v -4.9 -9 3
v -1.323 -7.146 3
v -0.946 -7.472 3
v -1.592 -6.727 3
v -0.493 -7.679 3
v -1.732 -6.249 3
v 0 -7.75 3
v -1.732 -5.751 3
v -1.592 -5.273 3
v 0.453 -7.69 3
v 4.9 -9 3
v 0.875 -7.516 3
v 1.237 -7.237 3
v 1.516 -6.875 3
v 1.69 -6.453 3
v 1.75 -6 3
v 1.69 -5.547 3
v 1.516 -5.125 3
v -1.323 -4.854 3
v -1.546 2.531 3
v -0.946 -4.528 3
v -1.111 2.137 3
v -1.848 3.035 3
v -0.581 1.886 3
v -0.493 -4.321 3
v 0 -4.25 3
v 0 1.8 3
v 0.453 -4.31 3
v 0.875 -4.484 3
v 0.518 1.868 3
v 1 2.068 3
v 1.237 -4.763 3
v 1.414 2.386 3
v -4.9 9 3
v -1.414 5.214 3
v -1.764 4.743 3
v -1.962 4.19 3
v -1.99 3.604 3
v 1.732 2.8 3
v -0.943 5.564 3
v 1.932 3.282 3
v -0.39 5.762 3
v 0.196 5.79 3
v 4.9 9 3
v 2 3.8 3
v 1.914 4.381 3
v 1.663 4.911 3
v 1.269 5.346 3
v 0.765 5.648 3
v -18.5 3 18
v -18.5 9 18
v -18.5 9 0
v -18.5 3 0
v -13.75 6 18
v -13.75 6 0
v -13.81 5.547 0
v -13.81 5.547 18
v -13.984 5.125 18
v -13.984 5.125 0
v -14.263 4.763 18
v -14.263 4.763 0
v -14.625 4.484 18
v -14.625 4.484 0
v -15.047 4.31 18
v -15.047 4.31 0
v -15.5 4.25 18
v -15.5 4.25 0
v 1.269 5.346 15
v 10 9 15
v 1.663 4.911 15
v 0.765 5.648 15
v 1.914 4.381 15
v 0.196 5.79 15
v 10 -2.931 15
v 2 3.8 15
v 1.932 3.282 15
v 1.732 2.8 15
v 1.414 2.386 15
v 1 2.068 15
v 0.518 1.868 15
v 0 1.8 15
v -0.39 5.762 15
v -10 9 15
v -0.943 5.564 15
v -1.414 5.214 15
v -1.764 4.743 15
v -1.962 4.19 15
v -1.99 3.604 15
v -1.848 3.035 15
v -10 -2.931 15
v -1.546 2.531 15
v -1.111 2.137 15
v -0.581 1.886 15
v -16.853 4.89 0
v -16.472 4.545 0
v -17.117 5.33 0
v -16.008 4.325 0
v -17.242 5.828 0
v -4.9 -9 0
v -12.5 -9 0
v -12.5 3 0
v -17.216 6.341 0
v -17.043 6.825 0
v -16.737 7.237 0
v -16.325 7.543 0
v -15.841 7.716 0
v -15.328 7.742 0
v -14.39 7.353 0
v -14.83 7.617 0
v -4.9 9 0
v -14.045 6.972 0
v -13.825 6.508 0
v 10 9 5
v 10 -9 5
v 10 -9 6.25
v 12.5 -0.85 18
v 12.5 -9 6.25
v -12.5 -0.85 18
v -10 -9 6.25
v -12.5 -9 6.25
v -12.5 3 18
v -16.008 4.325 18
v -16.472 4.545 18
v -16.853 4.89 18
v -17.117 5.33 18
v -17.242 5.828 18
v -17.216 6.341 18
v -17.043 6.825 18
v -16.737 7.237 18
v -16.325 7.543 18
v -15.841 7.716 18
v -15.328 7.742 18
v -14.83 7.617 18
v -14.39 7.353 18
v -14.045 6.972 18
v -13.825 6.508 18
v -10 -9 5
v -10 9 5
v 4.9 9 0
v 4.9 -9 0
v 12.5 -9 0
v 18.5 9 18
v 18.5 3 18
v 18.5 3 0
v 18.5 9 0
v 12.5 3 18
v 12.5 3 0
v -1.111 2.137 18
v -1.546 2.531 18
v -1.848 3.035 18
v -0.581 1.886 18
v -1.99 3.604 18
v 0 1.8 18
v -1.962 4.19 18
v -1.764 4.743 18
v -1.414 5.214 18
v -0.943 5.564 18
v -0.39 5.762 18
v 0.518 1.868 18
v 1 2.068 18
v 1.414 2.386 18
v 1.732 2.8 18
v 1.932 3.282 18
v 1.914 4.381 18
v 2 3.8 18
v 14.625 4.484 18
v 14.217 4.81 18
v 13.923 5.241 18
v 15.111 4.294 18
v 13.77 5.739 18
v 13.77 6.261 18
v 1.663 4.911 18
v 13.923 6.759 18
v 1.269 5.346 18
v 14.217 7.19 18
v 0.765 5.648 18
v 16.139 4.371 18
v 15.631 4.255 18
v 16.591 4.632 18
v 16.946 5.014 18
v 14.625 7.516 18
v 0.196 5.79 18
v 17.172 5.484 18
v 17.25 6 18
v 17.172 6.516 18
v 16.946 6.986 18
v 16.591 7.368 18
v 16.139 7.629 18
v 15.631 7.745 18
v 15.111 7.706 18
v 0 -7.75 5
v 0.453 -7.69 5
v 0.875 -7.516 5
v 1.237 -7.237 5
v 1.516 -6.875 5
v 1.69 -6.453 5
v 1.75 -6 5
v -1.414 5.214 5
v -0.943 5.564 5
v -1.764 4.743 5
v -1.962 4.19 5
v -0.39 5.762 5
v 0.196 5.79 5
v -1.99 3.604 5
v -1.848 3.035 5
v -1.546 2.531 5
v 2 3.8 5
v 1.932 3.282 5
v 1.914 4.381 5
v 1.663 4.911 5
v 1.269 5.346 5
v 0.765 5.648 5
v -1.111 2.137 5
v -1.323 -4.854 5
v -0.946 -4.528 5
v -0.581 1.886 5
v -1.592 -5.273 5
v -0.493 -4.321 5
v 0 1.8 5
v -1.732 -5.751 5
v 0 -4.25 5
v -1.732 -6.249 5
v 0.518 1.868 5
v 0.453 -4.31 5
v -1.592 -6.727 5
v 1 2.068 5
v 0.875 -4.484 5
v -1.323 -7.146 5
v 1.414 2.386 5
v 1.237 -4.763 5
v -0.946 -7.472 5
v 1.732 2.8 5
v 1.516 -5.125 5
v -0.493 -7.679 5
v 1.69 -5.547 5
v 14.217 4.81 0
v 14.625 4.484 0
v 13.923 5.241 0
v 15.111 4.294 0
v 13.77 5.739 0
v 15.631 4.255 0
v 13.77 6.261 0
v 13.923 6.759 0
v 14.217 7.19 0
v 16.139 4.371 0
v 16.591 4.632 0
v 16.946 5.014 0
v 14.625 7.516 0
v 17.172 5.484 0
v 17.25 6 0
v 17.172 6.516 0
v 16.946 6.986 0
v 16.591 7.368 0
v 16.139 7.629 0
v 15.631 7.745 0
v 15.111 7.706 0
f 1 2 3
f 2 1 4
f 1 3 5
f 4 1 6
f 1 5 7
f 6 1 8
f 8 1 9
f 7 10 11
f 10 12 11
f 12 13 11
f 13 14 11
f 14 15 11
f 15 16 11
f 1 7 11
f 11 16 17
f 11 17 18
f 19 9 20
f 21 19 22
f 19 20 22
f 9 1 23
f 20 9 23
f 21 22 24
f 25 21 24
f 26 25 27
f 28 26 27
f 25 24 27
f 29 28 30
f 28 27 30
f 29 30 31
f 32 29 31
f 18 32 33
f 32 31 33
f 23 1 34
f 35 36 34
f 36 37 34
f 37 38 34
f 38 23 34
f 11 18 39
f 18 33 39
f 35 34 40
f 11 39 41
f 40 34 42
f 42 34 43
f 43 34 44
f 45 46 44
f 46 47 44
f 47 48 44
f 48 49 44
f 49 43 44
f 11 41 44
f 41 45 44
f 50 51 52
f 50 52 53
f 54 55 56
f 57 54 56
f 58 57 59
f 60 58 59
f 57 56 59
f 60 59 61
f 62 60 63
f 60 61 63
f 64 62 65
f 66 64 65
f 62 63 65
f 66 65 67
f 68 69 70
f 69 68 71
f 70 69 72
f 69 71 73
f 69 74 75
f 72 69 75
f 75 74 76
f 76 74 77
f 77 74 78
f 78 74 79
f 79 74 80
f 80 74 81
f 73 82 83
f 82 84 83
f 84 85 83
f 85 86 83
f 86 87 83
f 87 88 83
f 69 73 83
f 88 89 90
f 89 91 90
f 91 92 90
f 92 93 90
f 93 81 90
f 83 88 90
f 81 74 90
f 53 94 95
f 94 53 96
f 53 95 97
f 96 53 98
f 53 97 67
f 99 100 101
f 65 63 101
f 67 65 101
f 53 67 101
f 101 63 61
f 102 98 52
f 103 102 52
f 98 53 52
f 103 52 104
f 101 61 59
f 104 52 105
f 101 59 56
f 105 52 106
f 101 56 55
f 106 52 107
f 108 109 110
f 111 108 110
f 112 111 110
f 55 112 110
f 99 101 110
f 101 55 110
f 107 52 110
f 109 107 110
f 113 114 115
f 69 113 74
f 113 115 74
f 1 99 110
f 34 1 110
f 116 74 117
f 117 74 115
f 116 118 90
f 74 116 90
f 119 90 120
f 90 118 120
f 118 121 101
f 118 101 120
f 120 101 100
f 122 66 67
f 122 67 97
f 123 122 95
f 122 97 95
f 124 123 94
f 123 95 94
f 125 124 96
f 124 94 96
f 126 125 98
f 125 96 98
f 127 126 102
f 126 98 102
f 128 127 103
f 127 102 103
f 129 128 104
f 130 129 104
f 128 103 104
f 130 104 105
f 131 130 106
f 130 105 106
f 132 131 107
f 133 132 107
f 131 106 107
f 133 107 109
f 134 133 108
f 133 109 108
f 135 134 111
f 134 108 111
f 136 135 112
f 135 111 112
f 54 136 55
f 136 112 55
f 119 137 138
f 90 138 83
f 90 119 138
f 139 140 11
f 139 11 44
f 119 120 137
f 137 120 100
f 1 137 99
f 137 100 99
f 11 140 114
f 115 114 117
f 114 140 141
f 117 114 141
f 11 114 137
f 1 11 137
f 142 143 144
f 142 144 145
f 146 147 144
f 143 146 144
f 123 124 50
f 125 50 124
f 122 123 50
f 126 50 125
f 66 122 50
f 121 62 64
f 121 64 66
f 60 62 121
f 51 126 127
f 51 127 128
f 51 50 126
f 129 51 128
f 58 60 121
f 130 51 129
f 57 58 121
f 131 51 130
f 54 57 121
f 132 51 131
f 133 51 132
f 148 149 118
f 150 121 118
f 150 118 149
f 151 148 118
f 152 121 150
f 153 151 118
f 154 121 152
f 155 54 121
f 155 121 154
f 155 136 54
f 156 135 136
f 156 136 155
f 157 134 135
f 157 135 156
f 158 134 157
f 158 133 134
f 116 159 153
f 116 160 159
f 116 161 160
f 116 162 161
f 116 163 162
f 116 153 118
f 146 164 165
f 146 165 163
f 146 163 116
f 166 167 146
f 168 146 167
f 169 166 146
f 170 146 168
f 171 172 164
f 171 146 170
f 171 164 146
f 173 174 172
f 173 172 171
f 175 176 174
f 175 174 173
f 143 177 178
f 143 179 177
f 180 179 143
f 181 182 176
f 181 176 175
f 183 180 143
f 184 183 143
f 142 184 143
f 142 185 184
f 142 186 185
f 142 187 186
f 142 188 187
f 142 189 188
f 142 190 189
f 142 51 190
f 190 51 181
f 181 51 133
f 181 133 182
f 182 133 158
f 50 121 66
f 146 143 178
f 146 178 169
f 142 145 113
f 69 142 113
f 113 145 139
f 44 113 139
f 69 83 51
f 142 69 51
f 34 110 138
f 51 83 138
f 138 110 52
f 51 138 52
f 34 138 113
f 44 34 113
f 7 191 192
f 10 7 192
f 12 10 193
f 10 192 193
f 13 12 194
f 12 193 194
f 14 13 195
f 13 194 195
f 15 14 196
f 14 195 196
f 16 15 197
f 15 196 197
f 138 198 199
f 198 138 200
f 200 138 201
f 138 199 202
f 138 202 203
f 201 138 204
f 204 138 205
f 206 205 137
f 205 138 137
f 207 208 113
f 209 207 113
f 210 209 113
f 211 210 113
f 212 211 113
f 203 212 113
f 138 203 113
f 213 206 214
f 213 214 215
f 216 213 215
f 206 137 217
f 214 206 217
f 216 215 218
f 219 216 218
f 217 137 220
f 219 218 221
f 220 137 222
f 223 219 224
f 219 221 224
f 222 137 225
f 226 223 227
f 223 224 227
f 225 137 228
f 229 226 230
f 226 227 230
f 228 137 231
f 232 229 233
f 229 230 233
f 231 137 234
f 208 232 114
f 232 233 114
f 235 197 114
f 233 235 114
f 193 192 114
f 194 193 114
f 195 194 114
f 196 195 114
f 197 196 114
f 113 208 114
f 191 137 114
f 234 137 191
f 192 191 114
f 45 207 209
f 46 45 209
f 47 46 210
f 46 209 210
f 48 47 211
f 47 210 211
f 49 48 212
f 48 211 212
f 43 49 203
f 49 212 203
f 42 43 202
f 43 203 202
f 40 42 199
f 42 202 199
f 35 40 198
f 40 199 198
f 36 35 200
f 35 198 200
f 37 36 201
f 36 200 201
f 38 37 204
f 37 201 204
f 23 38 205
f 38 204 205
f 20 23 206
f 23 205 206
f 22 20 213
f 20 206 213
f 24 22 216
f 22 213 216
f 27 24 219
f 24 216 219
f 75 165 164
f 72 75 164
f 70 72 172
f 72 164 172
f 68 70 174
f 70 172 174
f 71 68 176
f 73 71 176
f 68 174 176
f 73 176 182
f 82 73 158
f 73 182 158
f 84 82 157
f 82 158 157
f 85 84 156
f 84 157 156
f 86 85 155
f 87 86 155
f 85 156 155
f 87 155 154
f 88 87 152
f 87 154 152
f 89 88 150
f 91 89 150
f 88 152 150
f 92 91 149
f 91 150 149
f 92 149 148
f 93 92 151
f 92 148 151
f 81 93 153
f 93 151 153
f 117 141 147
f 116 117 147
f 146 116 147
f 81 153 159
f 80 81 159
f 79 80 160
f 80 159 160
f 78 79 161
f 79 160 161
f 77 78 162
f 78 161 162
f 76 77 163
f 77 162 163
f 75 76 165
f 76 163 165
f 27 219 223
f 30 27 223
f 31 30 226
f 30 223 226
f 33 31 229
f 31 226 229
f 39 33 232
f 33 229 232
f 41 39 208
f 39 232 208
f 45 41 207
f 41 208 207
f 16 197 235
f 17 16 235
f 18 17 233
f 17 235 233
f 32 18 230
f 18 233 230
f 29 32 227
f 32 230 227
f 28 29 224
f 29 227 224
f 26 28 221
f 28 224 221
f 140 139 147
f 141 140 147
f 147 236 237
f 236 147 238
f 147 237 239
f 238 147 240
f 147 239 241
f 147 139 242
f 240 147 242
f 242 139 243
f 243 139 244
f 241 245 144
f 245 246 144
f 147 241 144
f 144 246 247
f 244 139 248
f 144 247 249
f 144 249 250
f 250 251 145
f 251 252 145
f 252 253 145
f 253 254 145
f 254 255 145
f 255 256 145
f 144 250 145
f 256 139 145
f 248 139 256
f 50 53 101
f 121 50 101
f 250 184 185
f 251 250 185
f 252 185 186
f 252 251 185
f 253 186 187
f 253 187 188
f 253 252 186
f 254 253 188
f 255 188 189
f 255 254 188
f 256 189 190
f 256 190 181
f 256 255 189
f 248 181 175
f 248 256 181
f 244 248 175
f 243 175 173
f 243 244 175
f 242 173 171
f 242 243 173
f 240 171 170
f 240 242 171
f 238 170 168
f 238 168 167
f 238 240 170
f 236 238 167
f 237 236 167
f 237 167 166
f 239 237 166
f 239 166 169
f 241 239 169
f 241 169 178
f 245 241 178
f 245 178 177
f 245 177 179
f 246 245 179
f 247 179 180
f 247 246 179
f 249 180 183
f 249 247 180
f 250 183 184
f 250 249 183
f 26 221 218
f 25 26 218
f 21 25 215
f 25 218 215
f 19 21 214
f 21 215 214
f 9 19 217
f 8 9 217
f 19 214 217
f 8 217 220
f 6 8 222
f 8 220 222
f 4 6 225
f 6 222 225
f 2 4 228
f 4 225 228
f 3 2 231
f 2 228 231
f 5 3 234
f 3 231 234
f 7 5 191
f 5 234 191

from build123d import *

# Parameters (mm, degrees)
F0_W     = 6
F0_H     = 6
F0_R     = 1.75
F2_DEPTH = 18
F1_W     = 9.8
F1_H     = 18
F3_DEPTH = 3
F4_W     = 10
F4_H     = 10
F5_DEPTH = 20
F8_DEPTH = 25
F9_DEPTH = 25


with BuildPart() as f2:
    # F0 (on Top) → F2 (new body)
    with BuildSketch(Plane.XY):
        Polygon((12.5, 9), (-12.5, 9), (-12.5, 3), (-12.5, -9), (12.5, -9), (12.5, 3), align=None)
        with BuildLine():
            ThreePointArc((-13.75, 6), (-16.737437, 7.237437), (-15.5, 4.25))
            ThreePointArc((-15.5, 4.25), (-14.262563, 4.762563), (-13.75, 6))
        make_face()
        Polygon((-12.5, 3), (-12.5, 9), (-18.5, 9), (-18.5, 3), (-15.5, 3), align=None)
        with BuildLine():
            ThreePointArc((-13.75, 6), (-14.262563, 4.762563), (-15.5, 4.25))
            ThreePointArc((-15.5, 4.25), (-16.737437, 7.237437), (-13.75, 6))
        make_face(mode=Mode.SUBTRACT)
        with Locations((15.5, 6)):
            Rectangle(F0_W, F0_H)
        with Locations((15.5, 6)):
            Circle(F0_R, mode=Mode.SUBTRACT)
    extrude(amount=F2_DEPTH)

    # F1 (on face) → F3 (cut)
    with BuildSketch(Plane.XY):
        Rectangle(F1_W, F1_H)
    extrude(amount=F3_DEPTH, mode=Mode.SUBTRACT)

    # F4 (on face) → F5 (cut)
    with BuildSketch(Plane.XZ.offset(9)):
        with Locations((5, 10)):
            Rectangle(F4_W, F4_H)
        with Locations((-5, 10)):
            Rectangle(F4_W, F4_H)
    extrude(amount=-F5_DEPTH, mode=Mode.SUBTRACT)

    # F7 (on face) → F8 (cut)
    with BuildSketch(Plane(origin=(-12.5, 0, 0), x_dir=(0, -1, 0), z_dir=(-1, 0, 0))):
        Polygon((0.850376, 18), (9, 6.250017), (9, 18), align=None)
    extrude(amount=-F8_DEPTH, mode=Mode.SUBTRACT)

    # F6 (on face) → F9 (cut)
    with BuildSketch(Plane.XY.offset(18)):
        with BuildLine():
            ThreePointArc((2, 3.8), (-1.414214, 5.214214), (0, 1.8))
            ThreePointArc((0, 1.8), (1.414214, 2.385786), (2, 3.8))
        make_face()
        with BuildLine():
            ThreePointArc((0, -4.25), (-1.75, -6), (0, -7.75))
            Line((0, -7.75), (0, -6))
            Line((0, -6), (0, -4.25))
        make_face()
        with BuildLine():
            Line((0, -6), (0, -7.75))
            ThreePointArc((0, -7.75), (1.237437, -7.237437), (1.75, -6))
            ThreePointArc((1.75, -6), (1.237437, -4.762563), (0, -4.25))
            Line((0, -4.25), (0, -6))
        make_face()
    extrude(amount=-F9_DEPTH, mode=Mode.SUBTRACT)


solid = f2.part
